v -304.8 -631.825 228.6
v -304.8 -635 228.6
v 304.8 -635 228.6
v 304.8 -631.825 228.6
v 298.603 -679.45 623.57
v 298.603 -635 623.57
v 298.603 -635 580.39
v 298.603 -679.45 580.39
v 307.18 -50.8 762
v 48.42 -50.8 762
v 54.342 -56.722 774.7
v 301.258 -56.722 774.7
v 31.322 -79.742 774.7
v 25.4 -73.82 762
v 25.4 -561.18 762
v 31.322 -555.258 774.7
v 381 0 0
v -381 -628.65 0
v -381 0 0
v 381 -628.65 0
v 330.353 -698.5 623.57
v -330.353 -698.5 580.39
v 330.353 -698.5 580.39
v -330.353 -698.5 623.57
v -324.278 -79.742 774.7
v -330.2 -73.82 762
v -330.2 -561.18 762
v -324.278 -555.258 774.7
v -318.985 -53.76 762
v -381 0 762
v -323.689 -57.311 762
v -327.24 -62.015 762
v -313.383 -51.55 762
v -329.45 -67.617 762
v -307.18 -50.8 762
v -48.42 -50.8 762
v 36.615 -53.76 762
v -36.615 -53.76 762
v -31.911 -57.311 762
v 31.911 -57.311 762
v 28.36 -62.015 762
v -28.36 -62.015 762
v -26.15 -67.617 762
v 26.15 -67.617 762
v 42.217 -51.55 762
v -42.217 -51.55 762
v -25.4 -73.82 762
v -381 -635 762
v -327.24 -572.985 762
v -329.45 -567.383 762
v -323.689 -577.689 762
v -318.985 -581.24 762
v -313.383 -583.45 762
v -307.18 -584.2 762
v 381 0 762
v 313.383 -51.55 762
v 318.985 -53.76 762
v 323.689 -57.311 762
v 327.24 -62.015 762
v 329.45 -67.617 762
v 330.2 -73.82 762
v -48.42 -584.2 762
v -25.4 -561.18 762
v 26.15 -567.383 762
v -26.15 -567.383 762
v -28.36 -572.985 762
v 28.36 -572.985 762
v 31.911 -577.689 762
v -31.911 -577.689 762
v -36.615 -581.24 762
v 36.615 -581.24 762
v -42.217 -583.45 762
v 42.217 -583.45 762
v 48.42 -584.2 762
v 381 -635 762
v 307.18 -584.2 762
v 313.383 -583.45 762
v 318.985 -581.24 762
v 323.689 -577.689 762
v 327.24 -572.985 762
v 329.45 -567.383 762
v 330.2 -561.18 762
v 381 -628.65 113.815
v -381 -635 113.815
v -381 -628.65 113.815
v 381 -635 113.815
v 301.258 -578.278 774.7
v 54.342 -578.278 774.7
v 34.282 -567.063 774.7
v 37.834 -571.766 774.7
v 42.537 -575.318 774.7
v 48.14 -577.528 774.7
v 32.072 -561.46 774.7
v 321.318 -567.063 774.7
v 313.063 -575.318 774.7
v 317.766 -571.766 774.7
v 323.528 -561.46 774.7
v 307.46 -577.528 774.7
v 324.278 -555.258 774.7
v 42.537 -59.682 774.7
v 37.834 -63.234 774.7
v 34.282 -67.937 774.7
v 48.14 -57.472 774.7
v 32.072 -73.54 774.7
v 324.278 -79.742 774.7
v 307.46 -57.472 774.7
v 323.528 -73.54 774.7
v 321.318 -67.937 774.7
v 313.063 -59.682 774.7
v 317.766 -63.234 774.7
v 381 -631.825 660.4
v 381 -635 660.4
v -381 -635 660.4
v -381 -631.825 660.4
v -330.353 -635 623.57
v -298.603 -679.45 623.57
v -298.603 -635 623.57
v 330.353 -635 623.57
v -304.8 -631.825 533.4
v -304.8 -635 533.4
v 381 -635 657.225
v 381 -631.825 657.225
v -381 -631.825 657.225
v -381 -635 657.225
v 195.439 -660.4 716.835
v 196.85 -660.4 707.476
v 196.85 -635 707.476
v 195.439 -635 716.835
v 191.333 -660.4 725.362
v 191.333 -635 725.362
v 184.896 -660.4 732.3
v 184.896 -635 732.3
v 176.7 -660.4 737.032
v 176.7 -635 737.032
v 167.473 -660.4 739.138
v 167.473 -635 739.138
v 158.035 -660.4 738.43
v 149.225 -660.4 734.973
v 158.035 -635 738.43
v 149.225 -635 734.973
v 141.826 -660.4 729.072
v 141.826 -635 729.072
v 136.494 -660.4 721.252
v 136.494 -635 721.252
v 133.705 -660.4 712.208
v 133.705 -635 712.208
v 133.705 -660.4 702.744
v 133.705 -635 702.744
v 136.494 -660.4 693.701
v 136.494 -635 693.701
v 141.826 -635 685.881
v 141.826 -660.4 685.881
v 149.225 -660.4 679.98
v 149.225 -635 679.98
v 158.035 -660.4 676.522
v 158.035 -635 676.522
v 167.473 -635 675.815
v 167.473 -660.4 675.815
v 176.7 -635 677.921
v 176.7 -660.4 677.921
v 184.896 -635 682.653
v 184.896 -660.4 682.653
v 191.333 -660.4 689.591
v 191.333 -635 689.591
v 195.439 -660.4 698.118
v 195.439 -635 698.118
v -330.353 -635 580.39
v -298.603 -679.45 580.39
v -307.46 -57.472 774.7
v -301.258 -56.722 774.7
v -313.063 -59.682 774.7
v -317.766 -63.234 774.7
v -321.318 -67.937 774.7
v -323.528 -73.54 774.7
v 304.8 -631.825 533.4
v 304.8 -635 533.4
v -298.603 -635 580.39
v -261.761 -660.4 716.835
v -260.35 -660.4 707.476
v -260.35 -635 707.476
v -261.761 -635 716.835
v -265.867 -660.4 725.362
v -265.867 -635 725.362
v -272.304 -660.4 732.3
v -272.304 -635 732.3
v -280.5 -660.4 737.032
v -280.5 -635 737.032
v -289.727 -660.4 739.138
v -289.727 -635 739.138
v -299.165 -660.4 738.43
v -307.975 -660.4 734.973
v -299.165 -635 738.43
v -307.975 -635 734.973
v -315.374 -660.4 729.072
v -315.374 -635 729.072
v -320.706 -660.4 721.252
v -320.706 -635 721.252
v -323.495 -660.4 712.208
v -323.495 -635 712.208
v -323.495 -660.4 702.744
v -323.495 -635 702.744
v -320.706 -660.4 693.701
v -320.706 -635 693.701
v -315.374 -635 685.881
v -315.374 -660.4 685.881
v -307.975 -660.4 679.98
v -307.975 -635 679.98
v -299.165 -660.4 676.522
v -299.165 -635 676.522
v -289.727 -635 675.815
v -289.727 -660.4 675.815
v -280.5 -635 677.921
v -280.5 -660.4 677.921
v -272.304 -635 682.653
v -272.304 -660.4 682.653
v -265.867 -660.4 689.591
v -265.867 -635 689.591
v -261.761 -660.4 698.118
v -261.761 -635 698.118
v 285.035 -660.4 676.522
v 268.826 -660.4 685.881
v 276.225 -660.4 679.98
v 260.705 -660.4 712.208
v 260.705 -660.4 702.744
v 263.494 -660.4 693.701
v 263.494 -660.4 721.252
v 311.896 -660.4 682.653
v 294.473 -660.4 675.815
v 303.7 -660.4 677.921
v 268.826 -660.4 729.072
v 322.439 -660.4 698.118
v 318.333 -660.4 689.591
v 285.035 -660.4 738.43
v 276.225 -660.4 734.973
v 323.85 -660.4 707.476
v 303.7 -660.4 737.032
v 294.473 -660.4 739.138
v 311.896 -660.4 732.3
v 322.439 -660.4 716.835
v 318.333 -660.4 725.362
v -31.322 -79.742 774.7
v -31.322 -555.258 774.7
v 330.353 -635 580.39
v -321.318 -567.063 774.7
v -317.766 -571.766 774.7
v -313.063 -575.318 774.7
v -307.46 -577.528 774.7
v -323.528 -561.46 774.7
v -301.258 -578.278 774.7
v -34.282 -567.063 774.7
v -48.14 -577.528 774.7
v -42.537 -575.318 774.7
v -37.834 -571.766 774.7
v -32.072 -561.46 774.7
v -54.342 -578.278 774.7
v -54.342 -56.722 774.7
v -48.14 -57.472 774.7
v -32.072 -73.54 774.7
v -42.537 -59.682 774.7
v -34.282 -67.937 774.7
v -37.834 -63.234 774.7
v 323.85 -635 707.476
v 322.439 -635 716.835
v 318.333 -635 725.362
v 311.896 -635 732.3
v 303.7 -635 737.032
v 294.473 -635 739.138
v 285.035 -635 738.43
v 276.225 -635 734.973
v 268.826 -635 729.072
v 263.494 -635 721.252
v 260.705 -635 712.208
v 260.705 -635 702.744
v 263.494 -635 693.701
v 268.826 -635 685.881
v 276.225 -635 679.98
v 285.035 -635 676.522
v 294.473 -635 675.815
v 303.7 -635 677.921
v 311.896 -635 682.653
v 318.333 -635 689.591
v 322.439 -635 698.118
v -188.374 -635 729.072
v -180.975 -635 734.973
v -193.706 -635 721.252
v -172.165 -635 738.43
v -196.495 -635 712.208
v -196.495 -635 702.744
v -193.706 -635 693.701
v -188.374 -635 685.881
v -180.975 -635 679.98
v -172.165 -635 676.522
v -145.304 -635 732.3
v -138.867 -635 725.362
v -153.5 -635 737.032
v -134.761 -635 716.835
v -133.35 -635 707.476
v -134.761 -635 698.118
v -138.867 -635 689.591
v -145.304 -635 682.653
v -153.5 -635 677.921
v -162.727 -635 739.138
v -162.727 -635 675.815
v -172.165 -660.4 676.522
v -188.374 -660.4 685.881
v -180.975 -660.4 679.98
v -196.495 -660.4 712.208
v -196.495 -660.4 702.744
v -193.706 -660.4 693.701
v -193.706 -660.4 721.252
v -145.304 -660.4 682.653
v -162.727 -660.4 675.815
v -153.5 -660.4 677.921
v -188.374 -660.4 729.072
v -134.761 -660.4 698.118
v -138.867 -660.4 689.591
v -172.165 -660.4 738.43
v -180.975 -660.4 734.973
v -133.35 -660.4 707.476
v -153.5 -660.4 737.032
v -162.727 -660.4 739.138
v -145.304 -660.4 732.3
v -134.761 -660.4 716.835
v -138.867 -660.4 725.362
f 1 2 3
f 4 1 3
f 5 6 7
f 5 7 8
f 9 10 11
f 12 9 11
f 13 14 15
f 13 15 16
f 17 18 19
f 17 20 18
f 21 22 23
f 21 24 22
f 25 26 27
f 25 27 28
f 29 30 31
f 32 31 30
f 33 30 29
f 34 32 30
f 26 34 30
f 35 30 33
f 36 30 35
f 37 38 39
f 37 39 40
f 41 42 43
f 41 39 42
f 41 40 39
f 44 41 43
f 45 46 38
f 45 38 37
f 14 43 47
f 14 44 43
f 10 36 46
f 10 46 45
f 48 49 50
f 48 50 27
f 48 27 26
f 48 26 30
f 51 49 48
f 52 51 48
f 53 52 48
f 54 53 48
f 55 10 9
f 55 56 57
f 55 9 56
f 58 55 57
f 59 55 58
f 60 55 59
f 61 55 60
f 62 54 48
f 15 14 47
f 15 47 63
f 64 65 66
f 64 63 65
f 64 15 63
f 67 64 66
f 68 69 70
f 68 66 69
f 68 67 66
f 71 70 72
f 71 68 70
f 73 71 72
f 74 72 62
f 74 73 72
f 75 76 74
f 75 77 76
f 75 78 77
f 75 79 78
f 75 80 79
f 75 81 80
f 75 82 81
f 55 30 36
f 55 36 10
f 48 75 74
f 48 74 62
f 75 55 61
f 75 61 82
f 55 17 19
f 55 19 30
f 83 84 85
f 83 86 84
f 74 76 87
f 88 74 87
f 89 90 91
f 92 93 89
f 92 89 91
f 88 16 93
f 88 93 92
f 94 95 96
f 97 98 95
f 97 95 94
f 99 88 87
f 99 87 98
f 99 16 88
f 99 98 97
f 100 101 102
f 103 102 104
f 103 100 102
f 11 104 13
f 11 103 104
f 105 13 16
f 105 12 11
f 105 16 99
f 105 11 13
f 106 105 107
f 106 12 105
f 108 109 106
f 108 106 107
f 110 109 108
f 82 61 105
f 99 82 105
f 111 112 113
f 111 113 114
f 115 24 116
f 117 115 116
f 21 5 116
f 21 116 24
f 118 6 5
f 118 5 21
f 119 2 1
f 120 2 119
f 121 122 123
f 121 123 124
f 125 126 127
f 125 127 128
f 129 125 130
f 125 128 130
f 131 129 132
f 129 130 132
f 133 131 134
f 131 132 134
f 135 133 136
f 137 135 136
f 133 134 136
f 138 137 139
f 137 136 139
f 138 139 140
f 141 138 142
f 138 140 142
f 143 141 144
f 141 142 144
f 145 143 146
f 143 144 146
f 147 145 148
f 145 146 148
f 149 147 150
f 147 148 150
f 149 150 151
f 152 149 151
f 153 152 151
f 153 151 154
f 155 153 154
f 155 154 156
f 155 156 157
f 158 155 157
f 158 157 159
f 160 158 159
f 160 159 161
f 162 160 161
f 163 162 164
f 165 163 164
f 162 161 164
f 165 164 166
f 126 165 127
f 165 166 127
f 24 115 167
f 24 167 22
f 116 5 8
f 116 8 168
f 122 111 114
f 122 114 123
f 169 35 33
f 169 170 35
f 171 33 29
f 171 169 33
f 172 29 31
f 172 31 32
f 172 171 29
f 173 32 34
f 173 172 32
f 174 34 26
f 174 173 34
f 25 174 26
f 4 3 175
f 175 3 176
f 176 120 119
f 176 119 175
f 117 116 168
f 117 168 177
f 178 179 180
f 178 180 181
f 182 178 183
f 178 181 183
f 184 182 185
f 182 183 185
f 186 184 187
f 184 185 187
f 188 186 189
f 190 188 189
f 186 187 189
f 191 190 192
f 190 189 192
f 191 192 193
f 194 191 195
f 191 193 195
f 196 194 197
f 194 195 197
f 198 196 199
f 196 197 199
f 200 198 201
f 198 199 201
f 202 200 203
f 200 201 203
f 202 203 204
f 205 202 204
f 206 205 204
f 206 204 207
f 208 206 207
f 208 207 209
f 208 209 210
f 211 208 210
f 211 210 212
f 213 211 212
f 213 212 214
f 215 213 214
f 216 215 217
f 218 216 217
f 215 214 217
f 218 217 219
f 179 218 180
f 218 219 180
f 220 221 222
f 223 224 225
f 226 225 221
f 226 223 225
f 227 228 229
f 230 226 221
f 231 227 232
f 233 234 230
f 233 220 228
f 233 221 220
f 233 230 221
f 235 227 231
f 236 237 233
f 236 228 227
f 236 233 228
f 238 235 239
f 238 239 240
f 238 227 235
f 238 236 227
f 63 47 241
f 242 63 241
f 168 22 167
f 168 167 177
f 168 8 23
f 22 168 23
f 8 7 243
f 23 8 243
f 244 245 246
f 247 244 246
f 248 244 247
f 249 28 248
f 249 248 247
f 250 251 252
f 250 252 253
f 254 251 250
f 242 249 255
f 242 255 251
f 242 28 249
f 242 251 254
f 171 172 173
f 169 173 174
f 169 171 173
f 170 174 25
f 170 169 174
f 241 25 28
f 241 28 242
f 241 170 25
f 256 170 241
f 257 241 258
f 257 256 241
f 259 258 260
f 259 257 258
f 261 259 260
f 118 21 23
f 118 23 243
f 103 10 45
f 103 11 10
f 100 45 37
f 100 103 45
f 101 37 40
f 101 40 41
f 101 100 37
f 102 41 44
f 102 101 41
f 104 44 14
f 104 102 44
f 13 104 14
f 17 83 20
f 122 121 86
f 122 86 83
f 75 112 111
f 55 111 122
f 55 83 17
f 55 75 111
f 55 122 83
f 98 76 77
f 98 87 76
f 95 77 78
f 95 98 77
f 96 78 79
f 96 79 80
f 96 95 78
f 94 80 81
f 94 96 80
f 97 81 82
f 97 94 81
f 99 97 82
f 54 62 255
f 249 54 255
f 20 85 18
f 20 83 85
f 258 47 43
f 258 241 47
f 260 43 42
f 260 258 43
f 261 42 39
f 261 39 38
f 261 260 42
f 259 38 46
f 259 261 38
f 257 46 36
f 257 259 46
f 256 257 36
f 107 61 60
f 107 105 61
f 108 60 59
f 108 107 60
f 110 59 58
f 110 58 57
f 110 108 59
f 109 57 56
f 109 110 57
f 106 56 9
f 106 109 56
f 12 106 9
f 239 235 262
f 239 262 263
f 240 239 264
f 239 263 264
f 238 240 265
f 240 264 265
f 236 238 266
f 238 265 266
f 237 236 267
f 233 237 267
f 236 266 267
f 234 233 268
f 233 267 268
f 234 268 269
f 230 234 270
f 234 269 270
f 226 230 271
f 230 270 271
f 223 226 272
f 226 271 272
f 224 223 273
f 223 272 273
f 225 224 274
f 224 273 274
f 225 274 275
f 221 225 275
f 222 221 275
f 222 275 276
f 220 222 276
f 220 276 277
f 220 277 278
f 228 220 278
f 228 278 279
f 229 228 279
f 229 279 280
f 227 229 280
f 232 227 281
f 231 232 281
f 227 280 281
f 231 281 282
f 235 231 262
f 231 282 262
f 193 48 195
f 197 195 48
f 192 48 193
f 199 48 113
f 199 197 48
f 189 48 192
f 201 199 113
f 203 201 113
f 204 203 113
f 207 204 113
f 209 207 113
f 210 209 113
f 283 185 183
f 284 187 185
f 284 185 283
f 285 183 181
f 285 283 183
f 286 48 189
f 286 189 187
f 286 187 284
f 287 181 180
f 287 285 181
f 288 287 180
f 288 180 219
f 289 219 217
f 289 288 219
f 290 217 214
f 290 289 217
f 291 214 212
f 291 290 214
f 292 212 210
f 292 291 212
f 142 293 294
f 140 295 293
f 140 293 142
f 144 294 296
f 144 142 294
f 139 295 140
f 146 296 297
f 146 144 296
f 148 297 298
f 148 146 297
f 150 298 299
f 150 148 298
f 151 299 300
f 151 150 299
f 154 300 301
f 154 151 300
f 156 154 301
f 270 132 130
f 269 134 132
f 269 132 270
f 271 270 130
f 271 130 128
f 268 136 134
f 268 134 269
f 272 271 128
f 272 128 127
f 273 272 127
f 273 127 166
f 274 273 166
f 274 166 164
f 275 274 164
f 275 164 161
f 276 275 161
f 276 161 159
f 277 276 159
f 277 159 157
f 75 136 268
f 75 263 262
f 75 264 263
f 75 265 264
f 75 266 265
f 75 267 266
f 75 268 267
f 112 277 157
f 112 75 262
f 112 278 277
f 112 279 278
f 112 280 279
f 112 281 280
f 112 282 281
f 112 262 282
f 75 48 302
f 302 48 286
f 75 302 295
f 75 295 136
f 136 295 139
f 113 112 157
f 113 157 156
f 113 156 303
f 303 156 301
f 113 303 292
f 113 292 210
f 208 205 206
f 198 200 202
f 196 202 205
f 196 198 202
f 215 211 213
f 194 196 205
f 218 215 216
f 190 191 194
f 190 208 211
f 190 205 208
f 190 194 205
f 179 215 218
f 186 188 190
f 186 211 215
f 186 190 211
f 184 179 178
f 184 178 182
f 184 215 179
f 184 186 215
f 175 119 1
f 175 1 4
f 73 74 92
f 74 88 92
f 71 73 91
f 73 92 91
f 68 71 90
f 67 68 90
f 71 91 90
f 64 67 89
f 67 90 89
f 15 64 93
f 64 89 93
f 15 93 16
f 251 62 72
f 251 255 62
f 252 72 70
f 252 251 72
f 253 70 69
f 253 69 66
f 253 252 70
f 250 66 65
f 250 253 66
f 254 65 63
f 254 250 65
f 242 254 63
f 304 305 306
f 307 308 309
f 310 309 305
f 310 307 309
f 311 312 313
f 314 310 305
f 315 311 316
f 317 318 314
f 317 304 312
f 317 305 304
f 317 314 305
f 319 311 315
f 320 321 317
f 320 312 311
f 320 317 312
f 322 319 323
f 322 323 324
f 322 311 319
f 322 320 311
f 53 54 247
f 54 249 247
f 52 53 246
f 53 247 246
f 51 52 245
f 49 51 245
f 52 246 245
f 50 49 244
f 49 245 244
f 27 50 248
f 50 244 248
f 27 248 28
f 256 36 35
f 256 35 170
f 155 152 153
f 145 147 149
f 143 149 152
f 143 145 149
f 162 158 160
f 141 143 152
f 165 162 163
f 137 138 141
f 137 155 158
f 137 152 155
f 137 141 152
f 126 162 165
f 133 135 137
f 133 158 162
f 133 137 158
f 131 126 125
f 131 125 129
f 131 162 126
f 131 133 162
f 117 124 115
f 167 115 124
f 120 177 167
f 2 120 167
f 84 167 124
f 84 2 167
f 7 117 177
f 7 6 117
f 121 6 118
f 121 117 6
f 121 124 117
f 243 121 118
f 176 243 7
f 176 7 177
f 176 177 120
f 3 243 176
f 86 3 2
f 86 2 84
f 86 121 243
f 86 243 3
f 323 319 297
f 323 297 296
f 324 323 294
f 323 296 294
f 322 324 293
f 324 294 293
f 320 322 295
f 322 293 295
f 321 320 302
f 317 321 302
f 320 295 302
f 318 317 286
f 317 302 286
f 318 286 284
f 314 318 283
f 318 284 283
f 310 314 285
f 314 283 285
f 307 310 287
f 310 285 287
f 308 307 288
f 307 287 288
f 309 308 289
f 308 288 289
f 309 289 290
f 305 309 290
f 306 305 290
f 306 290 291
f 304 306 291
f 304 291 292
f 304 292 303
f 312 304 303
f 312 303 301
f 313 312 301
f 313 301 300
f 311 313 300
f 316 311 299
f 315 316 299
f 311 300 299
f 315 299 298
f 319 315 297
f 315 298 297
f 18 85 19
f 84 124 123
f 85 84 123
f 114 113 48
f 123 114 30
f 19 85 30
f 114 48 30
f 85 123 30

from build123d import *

# Parameters (mm, degrees)
F1_DEPTH  = 381
F2_W      = 609.6
F2_H      = 304.8
F3_DEPTH  = 3.175
F6_DEPTH  = 21.59
F7_R      = 31.75
F8_DEPTH  = 25.4
F9_W      = 304.8
F9_H      = 533.4
F10_DEPTH = 12.7
F10_TAPER = 25
F11_R     = 25.4


with BuildPart() as f1:
    # F0 (on Right) → F1 (new body, symmetric)
    with BuildSketch(Plane.YZ):
        Polygon((-628.65, 0), (0, 0), (0, 762), (-635, 762), (-635, 660.4), (-631.825, 660.4), (-631.825, 657.225), (-635, 657.225), (-635, 113.8153895736), (-628.65, 113.8153895736), align=None)
    extrude(amount=F1_DEPTH, both=True)

    # F2 (on face) → F3 (cut)
    with BuildSketch(Plane.XZ.offset(635)):
        with Locations((0, 381)):
            Rectangle(F2_W, F2_H)
    extrude(amount=-F3_DEPTH, mode=Mode.SUBTRACT)

    # F5 (on offset) → F6 (join, symmetric)
    with BuildSketch(Plane.XY.offset(601.98)):
        Polygon((-330.3532366753, -698.5), (330.3532366753, -698.5), (330.3532366753, -609.3355417252), (298.6032366753, -609.3355417252), (298.6032366753, -679.45), (-298.6032366753, -679.45), (-298.6032366753, -609.3355417252), (-330.3532366753, -609.3355417252), align=None)
    extrude(amount=F6_DEPTH, both=True)

    # F7 (on face) → F8 (join)
    with BuildSketch(Plane.XZ.offset(635)):
        with Locations((-292.1, 707.4763774872)):
            Circle(F7_R)
        with Locations((-165.1, 707.4763774872)):
            Circle(F7_R)
        with Locations((165.1, 707.4763774872)):
            Circle(F7_R)
        with Locations((292.1, 707.4763774872)):
            Circle(F7_R)
    extrude(amount=F8_DEPTH)

    # F9 (on face) → F10 (join)
    with BuildSketch(Plane.XY.offset(762)):
        with Locations((-177.8, -317.5)):
            Rectangle(F9_W, F9_H)
        with Locations((177.8, -317.5)):
            Rectangle(F9_W, F9_H)
    extrude(amount=F10_DEPTH, taper=F10_TAPER)

    # F11
    f11_edges = [f1.edges().sort_by_distance(p)[0] for p in [
        (-327.238946, -581.238946, 768.35),
        (-28.361054, -581.238946, 768.35),
        (28.361054, -581.238946, 768.35),
        (28.361054, -53.761054, 768.35),
        (-327.238946, -53.761054, 768.35),
        (327.238946, -581.238946, 768.35),
        (327.238946, -53.761054, 768.35),
        (-28.361054, -53.761054, 768.35),
    ]]
    fillet(f11_edges, radius=F11_R)


solid = f1.part
